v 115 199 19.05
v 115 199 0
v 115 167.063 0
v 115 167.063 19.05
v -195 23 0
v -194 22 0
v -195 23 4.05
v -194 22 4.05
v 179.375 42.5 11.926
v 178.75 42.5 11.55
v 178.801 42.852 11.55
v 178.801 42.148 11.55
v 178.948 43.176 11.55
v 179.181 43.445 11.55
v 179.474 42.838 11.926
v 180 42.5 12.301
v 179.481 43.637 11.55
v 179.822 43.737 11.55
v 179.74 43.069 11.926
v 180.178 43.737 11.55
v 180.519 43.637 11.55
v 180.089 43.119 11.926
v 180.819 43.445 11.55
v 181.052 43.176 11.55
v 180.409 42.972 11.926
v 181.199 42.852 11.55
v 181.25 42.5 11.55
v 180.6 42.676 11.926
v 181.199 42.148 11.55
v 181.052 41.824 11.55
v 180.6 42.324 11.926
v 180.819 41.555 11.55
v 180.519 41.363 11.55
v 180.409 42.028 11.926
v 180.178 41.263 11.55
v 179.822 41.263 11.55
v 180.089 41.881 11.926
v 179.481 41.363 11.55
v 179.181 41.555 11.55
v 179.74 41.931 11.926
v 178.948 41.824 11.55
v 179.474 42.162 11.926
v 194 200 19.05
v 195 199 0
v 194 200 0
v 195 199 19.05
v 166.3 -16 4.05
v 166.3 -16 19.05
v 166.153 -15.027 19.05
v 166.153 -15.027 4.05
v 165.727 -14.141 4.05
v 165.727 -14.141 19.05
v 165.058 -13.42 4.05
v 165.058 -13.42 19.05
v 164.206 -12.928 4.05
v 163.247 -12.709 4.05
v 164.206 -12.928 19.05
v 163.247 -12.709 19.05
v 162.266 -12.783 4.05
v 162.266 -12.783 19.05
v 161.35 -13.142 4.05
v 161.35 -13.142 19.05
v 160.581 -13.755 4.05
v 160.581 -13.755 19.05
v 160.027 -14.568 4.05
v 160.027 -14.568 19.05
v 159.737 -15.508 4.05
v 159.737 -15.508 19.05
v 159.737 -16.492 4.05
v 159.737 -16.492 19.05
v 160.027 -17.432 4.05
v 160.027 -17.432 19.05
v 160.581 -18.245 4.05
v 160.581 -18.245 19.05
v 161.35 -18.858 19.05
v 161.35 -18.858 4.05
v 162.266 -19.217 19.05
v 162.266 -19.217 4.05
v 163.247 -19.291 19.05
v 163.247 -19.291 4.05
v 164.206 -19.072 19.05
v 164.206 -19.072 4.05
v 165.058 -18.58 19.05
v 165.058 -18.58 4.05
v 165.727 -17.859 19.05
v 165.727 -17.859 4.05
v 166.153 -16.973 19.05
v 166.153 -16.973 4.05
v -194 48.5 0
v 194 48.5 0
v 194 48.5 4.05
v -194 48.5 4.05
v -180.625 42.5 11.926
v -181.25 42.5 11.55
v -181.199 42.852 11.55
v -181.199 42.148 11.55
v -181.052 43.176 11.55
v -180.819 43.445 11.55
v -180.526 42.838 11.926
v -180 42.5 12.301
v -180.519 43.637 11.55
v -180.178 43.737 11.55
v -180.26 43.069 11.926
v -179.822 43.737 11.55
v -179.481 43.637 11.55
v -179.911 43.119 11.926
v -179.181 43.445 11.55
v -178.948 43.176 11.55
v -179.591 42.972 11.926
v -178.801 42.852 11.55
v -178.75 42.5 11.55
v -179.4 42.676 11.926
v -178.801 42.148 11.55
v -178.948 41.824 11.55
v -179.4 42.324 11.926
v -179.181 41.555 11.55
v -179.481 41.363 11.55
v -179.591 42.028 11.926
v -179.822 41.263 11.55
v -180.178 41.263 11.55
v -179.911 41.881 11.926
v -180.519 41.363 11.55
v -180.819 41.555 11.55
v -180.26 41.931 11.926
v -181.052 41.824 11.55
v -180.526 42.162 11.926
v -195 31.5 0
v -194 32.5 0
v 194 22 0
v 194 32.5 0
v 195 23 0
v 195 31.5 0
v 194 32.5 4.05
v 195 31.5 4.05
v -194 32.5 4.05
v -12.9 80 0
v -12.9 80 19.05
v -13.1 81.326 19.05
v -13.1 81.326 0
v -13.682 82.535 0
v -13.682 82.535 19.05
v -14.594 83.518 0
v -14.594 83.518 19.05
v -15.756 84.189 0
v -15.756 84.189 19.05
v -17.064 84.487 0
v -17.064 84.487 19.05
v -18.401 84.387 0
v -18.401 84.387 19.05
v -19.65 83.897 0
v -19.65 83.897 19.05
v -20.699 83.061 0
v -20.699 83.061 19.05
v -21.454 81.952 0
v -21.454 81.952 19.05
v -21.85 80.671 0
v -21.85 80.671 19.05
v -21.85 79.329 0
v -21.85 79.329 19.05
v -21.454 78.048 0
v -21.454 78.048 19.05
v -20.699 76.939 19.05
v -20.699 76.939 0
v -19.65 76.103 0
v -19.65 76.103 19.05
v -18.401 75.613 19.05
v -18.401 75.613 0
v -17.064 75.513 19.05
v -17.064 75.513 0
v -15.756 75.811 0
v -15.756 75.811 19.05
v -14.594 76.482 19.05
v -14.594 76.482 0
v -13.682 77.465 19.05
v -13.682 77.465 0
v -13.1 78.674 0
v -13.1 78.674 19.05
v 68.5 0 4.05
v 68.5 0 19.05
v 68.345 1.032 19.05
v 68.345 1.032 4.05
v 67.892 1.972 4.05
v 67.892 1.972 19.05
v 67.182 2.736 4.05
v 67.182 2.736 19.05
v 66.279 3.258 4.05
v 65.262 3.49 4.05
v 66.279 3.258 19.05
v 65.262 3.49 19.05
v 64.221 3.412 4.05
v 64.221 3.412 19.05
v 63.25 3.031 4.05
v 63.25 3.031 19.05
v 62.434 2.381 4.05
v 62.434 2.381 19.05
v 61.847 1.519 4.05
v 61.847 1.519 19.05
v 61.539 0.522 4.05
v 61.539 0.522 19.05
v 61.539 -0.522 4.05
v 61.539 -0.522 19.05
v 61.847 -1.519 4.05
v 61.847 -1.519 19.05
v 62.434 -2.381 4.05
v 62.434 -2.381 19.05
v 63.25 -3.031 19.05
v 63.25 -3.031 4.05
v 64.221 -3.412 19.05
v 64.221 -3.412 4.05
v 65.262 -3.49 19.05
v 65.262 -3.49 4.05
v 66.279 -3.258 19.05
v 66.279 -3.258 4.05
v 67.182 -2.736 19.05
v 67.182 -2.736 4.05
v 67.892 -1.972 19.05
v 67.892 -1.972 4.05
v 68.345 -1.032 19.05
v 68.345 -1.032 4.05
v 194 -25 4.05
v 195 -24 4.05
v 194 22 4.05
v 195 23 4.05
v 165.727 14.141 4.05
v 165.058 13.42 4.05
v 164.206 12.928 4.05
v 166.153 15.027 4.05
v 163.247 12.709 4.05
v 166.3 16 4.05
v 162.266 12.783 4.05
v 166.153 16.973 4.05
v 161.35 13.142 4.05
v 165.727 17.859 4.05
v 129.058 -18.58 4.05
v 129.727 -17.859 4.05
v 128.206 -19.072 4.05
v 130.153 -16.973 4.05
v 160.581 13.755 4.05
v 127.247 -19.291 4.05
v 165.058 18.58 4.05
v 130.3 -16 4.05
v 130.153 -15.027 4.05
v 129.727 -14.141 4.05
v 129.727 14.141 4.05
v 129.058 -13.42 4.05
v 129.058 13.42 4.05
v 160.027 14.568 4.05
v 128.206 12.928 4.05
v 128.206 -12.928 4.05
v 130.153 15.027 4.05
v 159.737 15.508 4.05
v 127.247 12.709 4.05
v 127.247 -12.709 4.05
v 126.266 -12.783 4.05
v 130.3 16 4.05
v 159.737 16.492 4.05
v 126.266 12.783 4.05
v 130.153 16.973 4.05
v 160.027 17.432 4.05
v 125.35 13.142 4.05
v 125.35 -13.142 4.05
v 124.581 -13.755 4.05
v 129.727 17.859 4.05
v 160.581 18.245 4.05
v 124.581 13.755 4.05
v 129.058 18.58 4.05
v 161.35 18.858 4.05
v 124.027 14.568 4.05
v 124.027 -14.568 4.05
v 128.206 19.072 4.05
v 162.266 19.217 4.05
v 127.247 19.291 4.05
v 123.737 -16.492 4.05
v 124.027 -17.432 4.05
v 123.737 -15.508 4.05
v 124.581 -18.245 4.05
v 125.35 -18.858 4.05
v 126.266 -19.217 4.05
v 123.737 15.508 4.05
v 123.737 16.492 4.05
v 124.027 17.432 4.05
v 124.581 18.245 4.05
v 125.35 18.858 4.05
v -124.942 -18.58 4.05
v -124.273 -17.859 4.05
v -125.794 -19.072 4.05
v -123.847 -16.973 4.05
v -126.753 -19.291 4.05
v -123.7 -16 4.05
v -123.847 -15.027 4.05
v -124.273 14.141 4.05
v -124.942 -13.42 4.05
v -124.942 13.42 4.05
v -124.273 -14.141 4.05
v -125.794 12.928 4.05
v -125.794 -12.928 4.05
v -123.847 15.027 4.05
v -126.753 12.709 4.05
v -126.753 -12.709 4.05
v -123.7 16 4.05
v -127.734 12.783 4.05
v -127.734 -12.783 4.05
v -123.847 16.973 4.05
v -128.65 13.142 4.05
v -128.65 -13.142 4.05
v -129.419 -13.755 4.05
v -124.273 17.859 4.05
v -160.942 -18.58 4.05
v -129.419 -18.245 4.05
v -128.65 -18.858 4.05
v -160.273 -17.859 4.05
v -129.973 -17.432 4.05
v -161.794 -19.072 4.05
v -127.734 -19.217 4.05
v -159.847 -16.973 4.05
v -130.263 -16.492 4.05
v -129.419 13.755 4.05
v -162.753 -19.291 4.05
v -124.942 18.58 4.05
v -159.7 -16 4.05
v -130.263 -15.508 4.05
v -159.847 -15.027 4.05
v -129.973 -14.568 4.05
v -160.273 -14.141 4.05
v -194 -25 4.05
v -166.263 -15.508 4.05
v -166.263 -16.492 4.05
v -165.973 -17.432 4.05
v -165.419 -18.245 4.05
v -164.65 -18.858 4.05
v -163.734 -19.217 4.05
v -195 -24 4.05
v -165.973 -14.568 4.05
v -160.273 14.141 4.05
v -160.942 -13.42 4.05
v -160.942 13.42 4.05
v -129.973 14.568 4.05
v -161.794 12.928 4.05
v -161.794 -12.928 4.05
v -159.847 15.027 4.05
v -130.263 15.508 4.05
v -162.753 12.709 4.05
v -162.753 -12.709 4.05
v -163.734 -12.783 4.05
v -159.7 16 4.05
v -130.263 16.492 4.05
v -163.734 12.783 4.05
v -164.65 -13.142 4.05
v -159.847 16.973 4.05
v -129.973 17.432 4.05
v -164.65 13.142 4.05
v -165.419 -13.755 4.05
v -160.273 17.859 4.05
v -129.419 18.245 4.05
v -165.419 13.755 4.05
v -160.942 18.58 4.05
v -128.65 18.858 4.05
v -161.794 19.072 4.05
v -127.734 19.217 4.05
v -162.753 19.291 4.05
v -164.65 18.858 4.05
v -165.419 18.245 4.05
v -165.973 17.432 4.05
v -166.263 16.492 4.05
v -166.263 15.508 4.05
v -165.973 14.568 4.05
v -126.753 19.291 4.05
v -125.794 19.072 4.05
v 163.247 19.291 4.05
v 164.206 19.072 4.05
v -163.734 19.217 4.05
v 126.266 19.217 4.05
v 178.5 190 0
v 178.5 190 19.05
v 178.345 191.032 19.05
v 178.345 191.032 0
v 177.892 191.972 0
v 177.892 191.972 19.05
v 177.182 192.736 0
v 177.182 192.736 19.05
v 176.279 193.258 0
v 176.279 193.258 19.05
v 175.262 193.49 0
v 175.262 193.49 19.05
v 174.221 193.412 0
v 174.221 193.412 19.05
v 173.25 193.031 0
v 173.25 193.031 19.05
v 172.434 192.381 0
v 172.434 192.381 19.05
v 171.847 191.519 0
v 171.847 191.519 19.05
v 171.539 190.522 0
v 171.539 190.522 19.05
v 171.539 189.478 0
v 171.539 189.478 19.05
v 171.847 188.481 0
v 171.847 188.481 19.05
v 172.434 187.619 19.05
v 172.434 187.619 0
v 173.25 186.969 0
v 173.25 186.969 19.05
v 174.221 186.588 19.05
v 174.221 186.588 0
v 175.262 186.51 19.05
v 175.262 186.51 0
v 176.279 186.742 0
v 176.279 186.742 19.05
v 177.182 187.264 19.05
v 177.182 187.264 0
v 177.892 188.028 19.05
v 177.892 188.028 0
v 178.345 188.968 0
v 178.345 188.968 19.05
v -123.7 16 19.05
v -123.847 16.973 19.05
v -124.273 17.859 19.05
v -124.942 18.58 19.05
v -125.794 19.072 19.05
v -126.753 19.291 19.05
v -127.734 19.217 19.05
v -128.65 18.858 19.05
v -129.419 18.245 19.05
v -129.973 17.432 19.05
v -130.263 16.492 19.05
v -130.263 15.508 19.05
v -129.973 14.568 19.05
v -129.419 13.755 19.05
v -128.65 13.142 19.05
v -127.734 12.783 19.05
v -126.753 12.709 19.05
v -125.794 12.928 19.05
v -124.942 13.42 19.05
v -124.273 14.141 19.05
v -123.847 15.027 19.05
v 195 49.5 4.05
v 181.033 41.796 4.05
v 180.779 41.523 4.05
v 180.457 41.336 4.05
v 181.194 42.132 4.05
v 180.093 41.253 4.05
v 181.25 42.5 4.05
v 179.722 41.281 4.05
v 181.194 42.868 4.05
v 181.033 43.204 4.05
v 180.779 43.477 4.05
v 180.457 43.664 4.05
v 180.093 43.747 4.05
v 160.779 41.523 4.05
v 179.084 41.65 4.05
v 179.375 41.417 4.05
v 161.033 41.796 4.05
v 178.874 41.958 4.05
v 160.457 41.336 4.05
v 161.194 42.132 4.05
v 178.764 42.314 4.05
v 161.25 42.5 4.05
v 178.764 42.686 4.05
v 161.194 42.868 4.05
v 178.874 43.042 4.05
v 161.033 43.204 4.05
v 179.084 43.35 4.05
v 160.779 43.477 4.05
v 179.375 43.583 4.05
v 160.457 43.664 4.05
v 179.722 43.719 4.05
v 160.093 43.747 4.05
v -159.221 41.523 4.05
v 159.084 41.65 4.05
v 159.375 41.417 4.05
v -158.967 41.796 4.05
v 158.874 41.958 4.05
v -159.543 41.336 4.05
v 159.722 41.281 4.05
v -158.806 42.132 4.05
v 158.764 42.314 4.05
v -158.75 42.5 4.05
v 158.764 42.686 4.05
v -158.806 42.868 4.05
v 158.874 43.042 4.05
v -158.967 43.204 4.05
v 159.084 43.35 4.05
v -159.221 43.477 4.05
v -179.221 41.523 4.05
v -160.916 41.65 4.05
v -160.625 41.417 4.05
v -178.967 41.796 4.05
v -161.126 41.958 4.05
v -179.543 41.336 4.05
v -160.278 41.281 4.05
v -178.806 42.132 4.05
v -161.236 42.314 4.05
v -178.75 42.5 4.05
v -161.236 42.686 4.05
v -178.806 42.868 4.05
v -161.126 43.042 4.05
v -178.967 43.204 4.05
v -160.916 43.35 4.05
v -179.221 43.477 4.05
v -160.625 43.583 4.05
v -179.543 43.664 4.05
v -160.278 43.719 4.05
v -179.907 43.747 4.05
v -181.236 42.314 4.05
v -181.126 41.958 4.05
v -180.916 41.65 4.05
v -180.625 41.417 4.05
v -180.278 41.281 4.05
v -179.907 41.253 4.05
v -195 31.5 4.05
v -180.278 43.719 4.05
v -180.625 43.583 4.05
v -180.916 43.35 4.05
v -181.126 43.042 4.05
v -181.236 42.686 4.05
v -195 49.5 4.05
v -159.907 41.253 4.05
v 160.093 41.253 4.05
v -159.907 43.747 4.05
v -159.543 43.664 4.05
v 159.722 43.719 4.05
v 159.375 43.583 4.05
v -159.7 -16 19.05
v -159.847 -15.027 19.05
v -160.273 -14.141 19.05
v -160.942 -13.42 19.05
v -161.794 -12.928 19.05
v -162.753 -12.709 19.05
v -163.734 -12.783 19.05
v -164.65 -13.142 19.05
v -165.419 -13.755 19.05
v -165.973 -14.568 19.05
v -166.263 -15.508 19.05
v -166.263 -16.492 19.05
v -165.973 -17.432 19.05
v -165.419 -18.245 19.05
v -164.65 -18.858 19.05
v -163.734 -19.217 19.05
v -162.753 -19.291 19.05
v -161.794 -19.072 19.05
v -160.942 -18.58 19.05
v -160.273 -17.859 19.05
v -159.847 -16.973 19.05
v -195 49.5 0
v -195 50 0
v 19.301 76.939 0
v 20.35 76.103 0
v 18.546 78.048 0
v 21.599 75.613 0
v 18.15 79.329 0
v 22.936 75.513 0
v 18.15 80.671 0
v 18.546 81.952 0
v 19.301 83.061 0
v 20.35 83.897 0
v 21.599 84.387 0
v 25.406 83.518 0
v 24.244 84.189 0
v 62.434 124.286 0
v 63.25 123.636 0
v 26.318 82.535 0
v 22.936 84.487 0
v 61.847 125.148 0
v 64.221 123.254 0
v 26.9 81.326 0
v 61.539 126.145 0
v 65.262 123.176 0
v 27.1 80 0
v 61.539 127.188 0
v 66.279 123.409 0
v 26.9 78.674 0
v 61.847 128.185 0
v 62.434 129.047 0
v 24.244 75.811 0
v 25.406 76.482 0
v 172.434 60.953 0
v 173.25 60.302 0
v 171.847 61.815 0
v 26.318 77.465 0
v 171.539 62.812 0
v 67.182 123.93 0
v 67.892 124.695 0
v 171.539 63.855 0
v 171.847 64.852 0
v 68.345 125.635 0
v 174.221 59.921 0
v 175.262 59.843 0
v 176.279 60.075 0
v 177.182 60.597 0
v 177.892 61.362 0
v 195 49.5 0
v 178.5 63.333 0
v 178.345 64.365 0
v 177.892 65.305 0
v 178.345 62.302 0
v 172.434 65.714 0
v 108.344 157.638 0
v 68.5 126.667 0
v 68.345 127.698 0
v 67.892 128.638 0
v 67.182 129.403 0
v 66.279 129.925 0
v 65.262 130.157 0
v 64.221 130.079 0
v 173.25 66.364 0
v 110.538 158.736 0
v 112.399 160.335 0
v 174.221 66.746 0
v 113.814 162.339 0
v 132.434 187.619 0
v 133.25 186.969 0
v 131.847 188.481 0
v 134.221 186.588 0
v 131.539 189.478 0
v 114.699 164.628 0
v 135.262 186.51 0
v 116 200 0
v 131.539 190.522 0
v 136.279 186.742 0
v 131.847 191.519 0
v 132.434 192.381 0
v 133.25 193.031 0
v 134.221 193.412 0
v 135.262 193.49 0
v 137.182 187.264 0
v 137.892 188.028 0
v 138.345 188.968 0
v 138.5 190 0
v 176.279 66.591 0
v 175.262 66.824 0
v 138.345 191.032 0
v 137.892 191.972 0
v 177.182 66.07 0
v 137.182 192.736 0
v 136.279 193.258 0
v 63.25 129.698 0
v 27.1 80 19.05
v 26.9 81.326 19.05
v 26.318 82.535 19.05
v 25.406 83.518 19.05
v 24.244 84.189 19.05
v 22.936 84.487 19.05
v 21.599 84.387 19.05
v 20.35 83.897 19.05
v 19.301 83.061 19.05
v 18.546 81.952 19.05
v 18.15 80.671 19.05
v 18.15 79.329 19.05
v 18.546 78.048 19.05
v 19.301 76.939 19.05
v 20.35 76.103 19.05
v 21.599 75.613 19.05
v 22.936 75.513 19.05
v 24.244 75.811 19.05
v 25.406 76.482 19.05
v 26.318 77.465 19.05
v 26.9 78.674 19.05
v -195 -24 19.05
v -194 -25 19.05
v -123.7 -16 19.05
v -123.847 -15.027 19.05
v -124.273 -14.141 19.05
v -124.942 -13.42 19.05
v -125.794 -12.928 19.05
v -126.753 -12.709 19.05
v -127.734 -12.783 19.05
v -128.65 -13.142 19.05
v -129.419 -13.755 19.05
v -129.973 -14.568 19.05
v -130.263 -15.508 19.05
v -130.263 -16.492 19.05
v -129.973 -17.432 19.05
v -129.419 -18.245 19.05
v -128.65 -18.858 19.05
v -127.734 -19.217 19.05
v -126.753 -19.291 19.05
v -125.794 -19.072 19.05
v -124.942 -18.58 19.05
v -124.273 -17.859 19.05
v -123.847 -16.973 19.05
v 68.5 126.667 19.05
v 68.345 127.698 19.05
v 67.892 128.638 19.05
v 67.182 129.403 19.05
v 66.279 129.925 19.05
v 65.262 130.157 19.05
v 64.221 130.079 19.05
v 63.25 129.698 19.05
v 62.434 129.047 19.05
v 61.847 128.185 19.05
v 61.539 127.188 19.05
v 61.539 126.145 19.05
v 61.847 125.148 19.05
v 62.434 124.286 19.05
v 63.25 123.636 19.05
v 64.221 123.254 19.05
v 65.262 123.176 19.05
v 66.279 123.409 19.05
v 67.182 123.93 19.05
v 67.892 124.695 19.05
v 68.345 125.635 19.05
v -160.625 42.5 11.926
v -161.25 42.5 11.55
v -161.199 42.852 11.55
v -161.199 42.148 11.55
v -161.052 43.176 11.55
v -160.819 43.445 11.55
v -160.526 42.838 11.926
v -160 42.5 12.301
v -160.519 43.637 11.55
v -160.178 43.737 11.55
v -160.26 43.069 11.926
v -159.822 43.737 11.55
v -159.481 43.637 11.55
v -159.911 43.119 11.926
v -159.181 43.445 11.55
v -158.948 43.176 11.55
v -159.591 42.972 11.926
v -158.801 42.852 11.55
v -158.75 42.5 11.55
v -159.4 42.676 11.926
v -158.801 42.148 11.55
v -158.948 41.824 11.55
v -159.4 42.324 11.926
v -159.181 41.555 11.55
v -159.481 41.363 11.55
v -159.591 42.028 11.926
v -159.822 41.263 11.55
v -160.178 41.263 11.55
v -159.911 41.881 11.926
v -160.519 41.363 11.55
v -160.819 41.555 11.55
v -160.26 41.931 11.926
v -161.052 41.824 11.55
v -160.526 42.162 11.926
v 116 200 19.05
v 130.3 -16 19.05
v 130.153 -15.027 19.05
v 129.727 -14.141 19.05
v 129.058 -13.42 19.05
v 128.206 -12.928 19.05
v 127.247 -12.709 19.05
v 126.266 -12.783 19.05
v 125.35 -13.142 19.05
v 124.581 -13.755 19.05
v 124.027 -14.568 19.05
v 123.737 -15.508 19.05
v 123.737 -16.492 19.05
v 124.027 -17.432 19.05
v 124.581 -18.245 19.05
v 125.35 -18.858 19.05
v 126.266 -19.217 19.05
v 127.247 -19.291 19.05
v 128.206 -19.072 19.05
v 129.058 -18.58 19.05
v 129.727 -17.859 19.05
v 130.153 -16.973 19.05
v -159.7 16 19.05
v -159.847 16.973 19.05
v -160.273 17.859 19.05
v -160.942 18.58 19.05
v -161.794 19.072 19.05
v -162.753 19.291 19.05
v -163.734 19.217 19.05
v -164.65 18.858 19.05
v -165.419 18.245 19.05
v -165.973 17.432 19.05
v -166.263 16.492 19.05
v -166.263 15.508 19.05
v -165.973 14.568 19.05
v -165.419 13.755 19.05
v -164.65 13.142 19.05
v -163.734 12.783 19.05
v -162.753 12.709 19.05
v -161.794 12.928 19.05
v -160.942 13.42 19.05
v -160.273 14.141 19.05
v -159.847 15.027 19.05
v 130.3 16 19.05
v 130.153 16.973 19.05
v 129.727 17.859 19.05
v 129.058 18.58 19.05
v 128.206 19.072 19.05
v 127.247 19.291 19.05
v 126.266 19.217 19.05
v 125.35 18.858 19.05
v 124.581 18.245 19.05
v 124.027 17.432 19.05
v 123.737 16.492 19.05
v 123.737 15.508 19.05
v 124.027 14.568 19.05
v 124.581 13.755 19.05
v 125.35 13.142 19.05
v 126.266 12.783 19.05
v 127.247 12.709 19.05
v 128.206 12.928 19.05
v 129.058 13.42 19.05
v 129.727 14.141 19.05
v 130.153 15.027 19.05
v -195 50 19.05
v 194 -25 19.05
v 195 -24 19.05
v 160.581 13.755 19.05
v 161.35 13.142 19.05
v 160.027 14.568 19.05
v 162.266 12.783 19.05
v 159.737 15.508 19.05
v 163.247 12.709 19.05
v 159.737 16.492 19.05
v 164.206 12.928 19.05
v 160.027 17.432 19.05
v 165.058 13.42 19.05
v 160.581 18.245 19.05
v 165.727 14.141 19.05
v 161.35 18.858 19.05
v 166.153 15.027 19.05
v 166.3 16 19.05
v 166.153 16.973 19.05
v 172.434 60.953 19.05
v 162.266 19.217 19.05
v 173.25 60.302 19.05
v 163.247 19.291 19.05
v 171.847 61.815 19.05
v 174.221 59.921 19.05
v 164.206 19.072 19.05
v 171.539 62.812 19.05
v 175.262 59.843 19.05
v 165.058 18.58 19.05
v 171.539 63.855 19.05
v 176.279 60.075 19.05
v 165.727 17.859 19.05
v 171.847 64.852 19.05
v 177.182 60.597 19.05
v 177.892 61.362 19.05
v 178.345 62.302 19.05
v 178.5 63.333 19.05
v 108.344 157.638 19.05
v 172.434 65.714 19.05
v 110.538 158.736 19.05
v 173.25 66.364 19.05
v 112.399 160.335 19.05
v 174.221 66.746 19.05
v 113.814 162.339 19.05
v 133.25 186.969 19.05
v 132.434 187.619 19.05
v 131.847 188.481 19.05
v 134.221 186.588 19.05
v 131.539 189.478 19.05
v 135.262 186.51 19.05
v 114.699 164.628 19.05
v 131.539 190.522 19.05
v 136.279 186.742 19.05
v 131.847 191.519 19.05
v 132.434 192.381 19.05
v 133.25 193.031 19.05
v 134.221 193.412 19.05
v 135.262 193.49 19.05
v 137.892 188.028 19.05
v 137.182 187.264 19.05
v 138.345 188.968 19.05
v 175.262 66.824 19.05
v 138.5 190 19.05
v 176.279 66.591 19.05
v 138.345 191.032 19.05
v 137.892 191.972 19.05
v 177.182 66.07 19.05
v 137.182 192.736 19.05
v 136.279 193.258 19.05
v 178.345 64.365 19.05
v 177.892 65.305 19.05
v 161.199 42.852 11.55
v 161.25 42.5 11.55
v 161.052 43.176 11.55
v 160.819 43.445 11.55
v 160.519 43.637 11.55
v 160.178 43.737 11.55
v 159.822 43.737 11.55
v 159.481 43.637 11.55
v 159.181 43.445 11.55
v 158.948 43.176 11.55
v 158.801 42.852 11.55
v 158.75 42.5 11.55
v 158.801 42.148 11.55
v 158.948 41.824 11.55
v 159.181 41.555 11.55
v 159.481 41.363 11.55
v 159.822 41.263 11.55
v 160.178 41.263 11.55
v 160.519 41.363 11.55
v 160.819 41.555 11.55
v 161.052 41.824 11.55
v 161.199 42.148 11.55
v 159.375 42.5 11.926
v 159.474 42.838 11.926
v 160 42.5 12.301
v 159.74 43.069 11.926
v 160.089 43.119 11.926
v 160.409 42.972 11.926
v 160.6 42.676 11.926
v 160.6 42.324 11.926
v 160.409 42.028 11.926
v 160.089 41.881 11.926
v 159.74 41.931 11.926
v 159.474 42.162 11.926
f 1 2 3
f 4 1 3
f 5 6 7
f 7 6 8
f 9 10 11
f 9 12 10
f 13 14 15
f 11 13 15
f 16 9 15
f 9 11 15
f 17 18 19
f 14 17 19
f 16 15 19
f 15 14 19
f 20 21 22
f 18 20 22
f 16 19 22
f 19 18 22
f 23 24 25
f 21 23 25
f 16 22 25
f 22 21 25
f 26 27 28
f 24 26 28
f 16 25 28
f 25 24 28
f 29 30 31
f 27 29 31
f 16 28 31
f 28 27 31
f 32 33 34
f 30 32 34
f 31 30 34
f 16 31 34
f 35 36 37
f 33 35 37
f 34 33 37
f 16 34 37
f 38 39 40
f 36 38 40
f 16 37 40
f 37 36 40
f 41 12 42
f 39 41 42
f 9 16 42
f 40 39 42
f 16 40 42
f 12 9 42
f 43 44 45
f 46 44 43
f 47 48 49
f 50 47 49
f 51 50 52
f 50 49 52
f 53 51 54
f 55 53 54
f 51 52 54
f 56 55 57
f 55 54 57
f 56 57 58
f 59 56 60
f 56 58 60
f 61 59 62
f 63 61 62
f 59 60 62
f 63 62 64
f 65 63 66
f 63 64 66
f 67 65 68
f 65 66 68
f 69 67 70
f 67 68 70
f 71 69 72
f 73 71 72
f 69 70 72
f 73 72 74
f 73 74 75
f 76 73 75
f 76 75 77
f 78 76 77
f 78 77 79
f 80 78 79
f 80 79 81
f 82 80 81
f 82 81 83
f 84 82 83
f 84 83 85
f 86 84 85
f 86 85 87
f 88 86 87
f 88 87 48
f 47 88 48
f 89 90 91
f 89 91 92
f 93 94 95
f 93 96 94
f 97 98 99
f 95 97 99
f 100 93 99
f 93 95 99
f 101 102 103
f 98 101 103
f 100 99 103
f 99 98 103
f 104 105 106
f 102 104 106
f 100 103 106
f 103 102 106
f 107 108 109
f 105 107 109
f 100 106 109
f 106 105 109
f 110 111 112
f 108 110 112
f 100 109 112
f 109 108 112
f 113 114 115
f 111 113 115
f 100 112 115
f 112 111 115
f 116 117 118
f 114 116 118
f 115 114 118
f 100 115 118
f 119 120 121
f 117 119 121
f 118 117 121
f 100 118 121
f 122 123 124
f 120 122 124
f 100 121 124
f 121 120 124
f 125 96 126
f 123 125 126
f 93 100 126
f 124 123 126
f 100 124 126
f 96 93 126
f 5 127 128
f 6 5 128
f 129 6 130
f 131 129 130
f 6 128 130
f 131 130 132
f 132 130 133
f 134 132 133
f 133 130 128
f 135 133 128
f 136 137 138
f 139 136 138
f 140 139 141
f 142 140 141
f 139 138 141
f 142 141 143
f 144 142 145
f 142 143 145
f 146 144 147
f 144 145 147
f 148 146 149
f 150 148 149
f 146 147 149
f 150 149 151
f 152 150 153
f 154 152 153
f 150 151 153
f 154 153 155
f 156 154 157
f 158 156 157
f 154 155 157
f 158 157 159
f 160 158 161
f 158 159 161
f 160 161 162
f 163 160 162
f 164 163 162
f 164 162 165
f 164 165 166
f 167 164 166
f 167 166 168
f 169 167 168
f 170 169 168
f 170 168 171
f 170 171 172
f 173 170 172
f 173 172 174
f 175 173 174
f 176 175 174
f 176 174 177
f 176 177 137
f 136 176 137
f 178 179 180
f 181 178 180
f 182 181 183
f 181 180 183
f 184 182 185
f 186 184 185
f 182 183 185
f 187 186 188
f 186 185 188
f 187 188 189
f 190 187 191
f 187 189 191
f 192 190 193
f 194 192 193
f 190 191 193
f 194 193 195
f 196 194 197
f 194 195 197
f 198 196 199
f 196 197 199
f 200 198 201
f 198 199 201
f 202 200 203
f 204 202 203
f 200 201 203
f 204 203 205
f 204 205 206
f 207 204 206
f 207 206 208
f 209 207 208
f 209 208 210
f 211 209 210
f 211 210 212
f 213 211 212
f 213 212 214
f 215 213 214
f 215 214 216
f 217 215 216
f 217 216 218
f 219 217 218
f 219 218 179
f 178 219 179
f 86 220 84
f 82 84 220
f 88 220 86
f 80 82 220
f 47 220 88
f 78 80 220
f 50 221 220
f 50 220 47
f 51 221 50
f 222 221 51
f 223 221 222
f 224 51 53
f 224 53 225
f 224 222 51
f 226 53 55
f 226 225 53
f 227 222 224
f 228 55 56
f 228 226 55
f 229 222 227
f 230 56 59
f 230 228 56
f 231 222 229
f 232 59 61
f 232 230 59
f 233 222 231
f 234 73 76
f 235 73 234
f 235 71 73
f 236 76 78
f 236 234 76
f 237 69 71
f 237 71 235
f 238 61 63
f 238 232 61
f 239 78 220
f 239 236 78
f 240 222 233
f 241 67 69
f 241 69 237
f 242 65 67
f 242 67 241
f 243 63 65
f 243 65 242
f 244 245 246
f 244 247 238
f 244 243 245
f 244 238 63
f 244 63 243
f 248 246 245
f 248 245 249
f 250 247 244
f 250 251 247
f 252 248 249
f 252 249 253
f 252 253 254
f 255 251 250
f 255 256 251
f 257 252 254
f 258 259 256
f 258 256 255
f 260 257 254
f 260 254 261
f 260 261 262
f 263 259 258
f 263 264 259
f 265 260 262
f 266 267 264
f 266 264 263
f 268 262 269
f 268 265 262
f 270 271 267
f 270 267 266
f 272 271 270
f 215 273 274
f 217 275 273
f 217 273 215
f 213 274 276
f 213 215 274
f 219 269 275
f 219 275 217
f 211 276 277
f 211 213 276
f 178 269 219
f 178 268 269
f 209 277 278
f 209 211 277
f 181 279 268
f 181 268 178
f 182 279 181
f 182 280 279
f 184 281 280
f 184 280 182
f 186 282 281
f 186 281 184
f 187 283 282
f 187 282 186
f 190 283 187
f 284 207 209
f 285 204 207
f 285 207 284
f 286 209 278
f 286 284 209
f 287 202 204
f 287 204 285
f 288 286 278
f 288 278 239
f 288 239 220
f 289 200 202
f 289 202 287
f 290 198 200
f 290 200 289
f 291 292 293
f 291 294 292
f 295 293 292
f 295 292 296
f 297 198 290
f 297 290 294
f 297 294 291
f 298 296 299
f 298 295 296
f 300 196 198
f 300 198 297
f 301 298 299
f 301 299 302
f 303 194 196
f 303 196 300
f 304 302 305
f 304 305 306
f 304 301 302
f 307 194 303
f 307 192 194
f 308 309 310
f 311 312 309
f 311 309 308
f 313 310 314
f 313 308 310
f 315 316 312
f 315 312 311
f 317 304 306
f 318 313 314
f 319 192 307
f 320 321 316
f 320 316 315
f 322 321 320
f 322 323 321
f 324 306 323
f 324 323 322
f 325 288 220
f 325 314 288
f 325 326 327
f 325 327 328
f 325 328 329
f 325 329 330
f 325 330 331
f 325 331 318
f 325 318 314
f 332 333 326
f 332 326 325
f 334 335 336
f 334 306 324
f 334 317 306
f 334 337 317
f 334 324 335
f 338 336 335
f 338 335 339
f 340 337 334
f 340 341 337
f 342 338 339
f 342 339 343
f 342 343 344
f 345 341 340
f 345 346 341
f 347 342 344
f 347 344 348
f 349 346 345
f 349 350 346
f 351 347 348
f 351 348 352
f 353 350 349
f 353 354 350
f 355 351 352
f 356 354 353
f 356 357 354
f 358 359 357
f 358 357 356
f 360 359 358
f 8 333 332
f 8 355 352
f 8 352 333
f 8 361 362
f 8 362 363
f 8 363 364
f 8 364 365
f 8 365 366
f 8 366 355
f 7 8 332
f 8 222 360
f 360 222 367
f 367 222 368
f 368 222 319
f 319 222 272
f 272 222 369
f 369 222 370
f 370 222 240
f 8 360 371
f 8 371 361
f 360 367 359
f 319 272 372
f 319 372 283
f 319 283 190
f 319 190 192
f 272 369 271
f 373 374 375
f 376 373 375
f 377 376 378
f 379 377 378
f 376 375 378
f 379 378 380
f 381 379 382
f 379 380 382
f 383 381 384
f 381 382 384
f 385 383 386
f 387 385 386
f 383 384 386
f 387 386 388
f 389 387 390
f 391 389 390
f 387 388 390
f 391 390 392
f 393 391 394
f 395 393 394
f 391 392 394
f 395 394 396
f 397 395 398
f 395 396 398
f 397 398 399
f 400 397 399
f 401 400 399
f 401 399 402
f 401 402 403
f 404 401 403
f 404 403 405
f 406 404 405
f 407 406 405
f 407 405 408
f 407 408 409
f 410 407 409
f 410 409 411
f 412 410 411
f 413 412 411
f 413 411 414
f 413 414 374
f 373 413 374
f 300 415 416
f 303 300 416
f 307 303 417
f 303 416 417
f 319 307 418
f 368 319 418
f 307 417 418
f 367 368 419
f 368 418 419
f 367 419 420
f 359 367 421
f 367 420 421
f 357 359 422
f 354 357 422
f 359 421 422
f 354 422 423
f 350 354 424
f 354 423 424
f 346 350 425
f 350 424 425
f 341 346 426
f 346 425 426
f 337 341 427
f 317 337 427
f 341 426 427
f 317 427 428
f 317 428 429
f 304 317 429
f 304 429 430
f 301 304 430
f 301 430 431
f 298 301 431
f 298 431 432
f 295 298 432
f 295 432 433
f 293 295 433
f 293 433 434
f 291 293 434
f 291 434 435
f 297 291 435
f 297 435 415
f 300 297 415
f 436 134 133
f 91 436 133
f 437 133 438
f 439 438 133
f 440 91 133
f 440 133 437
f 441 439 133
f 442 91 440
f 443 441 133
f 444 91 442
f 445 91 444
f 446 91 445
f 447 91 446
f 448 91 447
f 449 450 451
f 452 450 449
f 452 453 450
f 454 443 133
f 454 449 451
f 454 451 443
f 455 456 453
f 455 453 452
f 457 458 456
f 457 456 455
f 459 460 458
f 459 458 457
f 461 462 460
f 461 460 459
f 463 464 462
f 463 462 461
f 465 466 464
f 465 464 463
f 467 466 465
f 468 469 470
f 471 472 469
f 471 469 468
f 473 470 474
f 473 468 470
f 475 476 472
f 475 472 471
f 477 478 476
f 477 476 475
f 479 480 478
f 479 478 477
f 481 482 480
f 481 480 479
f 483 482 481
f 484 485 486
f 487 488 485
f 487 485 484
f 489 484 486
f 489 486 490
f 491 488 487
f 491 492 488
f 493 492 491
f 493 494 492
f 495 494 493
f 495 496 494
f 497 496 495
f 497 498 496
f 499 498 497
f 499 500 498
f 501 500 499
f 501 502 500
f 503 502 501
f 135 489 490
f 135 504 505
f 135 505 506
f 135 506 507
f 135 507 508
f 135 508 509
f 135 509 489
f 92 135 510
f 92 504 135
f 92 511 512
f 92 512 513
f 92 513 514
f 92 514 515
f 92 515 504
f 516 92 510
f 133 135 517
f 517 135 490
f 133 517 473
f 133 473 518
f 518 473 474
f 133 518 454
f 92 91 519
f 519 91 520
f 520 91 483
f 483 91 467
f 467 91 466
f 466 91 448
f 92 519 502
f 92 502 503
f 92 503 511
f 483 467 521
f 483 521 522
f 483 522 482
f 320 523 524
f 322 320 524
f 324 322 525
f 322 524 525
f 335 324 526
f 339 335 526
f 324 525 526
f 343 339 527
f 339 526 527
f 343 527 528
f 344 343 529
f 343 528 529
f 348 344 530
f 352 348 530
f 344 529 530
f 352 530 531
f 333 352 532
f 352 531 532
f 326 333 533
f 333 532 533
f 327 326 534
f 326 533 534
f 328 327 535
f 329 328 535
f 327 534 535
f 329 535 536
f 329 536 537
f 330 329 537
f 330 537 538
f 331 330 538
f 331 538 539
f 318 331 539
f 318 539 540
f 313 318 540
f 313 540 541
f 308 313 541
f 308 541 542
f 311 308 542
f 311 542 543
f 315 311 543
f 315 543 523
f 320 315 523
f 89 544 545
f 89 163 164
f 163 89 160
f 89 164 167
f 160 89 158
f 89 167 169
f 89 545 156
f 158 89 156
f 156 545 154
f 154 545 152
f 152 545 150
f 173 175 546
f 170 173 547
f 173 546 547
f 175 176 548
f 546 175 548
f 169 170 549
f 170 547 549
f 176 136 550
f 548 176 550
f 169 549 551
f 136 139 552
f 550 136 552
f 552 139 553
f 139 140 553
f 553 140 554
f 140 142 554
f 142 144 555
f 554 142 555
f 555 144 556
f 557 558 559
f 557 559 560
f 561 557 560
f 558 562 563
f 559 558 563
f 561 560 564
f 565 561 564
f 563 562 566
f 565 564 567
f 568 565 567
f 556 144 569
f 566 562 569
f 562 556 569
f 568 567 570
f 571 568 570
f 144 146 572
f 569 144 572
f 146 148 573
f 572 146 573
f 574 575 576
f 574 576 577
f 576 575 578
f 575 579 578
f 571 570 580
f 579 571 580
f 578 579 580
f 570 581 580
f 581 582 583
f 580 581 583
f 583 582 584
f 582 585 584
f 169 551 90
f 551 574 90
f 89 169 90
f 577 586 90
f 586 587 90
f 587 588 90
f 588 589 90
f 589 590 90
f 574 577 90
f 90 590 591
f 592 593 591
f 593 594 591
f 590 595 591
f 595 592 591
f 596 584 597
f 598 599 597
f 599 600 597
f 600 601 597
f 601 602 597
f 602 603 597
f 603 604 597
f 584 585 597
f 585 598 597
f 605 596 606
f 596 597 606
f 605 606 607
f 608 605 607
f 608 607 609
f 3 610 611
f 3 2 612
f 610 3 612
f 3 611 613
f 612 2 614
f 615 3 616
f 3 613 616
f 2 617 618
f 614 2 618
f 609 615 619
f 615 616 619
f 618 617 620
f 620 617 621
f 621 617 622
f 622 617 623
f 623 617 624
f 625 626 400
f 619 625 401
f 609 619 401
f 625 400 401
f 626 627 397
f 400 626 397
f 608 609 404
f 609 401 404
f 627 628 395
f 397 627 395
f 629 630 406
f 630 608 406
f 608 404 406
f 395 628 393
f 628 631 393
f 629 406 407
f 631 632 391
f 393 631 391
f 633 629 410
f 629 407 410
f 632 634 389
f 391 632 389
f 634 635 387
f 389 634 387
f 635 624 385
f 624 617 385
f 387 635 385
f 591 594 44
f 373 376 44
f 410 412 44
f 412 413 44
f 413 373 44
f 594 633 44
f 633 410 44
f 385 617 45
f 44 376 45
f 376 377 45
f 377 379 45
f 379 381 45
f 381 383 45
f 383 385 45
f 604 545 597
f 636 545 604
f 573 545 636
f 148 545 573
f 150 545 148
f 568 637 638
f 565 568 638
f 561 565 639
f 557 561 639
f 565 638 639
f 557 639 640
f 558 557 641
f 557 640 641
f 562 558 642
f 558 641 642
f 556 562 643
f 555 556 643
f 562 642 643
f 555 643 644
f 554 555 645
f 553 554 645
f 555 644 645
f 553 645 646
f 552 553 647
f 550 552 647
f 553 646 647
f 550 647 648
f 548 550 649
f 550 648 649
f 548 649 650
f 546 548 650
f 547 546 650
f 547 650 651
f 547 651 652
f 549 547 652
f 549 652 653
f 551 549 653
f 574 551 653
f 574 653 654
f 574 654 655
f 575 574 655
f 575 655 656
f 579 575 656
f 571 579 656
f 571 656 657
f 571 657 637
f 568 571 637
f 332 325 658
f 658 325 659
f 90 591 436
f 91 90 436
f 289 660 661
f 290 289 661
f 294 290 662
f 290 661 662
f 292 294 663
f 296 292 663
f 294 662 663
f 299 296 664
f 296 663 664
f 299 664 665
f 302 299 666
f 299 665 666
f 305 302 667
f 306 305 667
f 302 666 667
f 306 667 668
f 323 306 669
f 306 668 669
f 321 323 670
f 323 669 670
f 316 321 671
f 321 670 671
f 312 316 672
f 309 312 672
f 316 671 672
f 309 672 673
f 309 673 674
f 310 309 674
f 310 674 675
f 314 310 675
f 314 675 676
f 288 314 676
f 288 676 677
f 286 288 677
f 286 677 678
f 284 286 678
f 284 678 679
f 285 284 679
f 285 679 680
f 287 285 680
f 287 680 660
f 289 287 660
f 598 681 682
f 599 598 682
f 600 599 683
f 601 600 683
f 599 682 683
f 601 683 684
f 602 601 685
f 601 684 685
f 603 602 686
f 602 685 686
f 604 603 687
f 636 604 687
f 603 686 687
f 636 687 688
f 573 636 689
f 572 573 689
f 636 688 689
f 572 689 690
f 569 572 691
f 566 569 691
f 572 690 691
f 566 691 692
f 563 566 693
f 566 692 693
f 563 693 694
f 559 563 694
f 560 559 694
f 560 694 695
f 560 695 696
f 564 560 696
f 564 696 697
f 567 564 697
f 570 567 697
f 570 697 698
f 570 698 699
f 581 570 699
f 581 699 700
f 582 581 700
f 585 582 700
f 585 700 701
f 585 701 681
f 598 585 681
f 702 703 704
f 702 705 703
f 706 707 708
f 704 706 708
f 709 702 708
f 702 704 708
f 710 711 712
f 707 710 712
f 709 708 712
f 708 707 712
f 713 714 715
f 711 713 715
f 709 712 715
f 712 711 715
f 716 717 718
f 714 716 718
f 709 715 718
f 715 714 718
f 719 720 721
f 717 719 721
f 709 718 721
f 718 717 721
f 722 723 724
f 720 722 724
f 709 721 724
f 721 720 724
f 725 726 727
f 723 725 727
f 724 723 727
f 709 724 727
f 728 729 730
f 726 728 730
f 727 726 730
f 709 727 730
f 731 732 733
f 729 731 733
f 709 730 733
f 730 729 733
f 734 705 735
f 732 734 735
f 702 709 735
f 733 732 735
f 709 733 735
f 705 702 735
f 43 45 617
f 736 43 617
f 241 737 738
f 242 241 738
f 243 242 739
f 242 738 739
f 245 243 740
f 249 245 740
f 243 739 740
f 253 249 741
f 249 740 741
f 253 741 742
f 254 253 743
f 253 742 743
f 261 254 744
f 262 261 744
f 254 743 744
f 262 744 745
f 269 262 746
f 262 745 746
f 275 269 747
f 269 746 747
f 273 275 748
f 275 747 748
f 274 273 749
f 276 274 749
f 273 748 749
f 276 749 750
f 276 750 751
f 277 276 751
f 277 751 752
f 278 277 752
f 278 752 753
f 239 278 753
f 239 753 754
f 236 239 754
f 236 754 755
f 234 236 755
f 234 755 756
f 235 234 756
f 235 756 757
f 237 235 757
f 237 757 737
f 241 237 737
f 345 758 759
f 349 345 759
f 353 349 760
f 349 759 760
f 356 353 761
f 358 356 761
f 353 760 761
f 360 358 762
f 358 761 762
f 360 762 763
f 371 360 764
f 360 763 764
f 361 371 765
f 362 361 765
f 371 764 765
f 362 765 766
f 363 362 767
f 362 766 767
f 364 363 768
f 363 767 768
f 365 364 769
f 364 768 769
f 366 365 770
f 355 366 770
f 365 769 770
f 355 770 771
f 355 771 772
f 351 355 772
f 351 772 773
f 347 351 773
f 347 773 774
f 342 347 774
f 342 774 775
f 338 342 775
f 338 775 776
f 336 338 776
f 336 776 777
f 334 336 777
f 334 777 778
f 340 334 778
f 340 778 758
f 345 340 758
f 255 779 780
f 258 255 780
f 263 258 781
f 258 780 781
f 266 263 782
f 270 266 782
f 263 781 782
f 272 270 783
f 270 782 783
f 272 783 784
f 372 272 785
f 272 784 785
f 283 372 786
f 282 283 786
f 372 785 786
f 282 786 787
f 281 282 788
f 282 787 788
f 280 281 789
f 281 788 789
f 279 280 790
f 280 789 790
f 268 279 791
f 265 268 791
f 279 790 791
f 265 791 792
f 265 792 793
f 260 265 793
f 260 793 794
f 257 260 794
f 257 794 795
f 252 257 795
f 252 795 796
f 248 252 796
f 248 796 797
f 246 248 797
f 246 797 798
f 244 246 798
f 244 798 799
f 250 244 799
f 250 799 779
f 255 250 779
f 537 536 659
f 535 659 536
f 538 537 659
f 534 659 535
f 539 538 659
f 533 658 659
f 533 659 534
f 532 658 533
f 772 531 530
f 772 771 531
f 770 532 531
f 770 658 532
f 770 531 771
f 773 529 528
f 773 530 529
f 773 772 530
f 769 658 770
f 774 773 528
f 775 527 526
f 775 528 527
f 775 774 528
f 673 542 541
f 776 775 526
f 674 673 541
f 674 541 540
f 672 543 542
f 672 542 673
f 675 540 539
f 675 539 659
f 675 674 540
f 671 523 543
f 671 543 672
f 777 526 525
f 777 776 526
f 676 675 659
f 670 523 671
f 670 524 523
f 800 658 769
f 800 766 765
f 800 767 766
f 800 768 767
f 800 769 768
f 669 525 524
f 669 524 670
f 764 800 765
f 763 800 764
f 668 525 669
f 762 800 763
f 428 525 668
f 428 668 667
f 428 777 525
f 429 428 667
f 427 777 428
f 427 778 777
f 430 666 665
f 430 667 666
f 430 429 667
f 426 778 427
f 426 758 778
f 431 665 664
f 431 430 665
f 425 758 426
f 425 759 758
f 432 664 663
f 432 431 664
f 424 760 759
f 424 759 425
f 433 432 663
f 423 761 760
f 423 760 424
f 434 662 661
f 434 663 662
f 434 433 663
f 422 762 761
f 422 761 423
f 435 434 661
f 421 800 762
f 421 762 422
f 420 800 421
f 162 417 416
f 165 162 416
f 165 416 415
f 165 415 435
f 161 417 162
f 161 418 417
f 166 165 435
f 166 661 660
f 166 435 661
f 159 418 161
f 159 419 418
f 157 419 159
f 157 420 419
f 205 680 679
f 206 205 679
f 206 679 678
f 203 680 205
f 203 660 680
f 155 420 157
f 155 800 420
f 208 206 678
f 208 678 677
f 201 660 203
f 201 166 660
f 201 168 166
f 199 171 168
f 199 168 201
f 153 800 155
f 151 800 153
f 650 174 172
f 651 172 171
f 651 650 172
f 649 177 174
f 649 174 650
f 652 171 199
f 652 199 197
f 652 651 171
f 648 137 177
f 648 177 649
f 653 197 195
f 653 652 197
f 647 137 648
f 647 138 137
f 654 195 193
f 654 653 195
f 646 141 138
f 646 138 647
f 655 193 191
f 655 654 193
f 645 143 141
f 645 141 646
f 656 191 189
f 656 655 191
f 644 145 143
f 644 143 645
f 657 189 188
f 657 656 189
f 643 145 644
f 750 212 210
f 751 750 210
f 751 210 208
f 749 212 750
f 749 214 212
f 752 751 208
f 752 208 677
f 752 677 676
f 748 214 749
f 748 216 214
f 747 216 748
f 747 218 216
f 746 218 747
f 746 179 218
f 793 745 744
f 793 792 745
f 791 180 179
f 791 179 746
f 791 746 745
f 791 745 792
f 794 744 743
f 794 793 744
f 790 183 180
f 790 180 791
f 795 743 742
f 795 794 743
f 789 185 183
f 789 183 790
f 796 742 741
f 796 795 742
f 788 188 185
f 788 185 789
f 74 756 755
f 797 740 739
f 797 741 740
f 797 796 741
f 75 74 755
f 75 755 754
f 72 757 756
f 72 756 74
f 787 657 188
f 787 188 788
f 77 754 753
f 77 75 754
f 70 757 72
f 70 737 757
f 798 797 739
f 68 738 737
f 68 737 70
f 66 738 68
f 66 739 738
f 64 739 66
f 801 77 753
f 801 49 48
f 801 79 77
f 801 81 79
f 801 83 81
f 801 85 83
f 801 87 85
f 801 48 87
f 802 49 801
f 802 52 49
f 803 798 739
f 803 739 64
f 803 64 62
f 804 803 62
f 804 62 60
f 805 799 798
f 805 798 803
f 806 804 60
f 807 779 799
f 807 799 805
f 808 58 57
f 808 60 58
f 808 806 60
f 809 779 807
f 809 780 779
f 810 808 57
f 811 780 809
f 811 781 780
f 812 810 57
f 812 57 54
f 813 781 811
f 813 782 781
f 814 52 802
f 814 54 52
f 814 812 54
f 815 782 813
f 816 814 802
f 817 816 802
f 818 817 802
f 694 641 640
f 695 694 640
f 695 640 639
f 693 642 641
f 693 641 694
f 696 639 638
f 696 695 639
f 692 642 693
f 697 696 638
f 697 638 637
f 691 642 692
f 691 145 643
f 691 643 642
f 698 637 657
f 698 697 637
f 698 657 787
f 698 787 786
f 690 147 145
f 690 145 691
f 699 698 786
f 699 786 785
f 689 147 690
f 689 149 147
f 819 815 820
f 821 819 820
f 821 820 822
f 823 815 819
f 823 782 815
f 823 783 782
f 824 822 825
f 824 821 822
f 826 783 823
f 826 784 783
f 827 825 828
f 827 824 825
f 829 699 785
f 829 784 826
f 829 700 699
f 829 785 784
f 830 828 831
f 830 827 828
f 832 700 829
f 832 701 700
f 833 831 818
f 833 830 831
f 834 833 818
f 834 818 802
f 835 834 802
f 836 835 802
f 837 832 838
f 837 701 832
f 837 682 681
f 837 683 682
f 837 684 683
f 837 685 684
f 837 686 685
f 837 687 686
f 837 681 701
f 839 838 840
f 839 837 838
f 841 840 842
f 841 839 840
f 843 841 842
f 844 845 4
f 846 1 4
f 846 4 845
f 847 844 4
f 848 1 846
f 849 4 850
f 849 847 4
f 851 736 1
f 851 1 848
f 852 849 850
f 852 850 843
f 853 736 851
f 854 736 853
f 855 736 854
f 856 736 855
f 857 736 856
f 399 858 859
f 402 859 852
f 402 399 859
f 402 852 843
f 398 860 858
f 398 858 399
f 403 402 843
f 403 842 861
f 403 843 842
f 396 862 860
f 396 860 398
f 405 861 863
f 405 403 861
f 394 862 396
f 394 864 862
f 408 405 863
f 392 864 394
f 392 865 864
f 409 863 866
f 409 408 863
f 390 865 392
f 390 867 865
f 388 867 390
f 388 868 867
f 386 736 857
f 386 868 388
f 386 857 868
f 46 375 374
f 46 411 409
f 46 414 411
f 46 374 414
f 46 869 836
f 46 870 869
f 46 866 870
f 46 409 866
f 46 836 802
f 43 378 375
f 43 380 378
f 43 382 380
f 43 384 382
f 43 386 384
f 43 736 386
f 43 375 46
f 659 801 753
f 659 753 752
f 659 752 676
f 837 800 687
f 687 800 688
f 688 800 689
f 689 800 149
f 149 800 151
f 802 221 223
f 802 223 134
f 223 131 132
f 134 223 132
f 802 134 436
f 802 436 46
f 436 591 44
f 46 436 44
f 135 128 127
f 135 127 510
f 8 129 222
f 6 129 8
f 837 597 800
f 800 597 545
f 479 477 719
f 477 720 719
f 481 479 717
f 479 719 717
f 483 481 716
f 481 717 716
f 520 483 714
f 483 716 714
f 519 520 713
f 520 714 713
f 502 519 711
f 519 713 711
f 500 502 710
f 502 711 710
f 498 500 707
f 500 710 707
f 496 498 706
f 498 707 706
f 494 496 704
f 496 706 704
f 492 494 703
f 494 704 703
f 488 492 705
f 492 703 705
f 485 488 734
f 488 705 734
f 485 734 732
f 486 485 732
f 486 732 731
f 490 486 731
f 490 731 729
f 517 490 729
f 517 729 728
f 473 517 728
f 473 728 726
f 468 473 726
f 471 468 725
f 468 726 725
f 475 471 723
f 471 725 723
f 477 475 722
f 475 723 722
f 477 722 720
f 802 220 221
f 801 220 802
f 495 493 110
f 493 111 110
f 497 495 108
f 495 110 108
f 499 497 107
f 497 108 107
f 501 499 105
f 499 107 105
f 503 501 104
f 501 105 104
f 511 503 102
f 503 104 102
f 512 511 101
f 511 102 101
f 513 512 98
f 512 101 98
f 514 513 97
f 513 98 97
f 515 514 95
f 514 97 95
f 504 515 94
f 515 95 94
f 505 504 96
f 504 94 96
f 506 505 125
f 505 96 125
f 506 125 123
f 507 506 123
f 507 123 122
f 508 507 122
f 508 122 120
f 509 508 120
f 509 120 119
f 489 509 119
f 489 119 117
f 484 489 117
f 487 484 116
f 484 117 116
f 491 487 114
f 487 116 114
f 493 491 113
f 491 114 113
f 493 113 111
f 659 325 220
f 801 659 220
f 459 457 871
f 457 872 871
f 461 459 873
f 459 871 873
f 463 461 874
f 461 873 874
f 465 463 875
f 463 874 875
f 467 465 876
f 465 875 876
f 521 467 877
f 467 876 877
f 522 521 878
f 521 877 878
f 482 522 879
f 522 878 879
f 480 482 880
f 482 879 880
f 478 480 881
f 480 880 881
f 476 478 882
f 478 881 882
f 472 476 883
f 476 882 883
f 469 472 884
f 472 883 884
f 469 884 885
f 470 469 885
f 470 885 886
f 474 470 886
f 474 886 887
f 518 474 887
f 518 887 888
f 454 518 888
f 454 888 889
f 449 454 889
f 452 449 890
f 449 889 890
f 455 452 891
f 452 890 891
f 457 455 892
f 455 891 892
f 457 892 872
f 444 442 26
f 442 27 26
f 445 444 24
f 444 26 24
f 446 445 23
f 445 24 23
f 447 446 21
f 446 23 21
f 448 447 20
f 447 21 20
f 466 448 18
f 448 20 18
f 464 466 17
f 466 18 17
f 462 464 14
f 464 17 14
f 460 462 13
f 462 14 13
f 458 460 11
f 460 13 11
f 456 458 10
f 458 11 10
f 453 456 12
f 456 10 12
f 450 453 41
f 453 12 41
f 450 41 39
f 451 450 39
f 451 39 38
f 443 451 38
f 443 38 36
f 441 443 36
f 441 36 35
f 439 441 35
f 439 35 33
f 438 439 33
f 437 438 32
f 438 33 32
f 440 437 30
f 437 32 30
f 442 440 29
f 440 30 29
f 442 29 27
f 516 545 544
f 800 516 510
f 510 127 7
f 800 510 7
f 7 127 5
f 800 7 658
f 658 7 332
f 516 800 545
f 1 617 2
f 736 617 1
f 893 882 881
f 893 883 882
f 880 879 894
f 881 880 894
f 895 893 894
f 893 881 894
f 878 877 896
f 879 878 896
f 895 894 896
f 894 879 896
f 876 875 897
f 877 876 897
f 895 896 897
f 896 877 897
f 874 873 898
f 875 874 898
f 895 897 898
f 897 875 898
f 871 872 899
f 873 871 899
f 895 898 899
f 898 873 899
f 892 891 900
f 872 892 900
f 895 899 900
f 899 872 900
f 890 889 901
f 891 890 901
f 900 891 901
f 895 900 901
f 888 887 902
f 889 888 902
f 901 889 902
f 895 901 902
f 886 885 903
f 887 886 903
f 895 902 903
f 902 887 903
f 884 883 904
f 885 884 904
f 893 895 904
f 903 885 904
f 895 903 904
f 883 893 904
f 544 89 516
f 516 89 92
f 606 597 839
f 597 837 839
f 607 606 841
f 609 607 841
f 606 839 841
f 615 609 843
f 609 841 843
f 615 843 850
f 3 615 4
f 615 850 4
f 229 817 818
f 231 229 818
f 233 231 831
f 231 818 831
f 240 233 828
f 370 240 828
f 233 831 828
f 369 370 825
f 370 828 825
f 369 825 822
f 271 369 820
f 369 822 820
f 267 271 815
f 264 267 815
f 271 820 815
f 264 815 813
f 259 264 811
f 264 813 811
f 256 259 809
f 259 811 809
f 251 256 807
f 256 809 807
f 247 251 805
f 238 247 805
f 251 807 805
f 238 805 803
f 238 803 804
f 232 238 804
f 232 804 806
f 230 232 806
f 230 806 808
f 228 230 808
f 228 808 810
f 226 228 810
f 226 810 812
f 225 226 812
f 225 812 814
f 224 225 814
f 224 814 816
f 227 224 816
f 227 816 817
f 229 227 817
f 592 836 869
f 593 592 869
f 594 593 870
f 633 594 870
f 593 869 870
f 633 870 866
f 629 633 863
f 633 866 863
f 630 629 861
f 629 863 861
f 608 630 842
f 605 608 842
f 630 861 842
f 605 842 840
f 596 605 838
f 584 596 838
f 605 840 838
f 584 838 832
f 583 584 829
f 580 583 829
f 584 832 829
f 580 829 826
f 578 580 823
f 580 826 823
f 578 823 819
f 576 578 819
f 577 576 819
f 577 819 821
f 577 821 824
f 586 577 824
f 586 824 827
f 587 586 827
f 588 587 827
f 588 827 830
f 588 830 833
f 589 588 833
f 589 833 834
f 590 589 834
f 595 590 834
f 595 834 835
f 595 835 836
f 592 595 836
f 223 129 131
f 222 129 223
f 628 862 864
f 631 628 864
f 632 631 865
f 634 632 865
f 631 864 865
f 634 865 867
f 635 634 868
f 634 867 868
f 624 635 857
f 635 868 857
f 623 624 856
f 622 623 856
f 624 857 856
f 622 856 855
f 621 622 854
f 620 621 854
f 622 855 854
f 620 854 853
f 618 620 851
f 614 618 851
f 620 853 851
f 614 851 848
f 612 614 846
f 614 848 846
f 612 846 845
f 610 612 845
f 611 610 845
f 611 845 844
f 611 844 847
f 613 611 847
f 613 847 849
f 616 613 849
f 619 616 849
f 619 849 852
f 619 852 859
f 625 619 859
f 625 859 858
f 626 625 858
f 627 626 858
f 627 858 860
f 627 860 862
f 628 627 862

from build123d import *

# Parameters (mm, degrees)
BOSS_EXTRUDE1_DEPTH       = 19.05
SKETCH2_W                 = 390
SKETCH2_H                 = 47
SKETCH2_H_2               = 16
CUT_EXTRUDE2_DEPTH        = 4.05
M6_CLEARANCE_HOLE1_D      = 6.6
M6_CLEARANCE_HOLE2_D      = 6.6
M3X0_5_TAPPED_HOLE1_D     = 2.5
M3X0_5_TAPPED_HOLE1_DEPTH = 7.5
M3X0_5_TAPPED_HOLE1_TIP   = 0.751075774
M8X1_0_TAPPED_HOLE1_D     = 7
M8_CLEARANCE_HOLE1_D      = 9
FILLET1_R                 = 10
CHAMFER1_SIZE             = 1


with BuildPart() as part:
    # Sketch1 → Boss-Extrude1 (new body)
    with BuildSketch(Plane.XY):
        Polygon((-195, 50), (-195, -25), (195, -25), (195, 200), (115, 200), (115, 160), align=None)
    extrude(amount=BOSS_EXTRUDE1_DEPTH)

    # Sketch2 → Cut-Extrude2 (cut)
    with BuildSketch(Plane(origin=(0, 0, 0), x_dir=(-1, 0, 0), z_dir=(0, 0, -1))):
        with Locations((0, -1.5)):
            Rectangle(SKETCH2_W, SKETCH2_H)
        with Locations((0, 40.5)):
            Rectangle(SKETCH2_W, SKETCH2_H_2)
    extrude(amount=-CUT_EXTRUDE2_DEPTH, mode=Mode.SUBTRACT)

    # M6 Clearance Hole1 (through all)
    with Locations(Plane(origin=(0, 0, 4.05), x_dir=(-1, 0, 0), z_dir=(0, 0, -1))):
        with Locations((127, 16), (163, 16), (163, -16), (127, -16)):
            Hole(M6_CLEARANCE_HOLE1_D / 2)

    # M6 Clearance Hole2 (through all)
    with Locations(Plane(origin=(0, 0, 4.05), x_dir=(-1, 0, 0), z_dir=(0, 0, -1))):
        with Locations((-163, 16), (-127, 16), (-127, -16), (-163, -16)):
            Hole(M6_CLEARANCE_HOLE2_D / 2)

    # M3x0.5 Tapped Hole1
    with Locations(Plane(origin=(0, 0, 4.05), x_dir=(-1, 0, 0), z_dir=(0, 0, -1))):
        with Locations((-180, 42.5), (-160, 42.5), (180, 42.5), (160, 42.5)):
            Hole(M3X0_5_TAPPED_HOLE1_D / 2, depth=M3X0_5_TAPPED_HOLE1_DEPTH)
            with Locations((0, 0, -(M3X0_5_TAPPED_HOLE1_DEPTH + M3X0_5_TAPPED_HOLE1_TIP / 2))):  # 118° drill point
                Cone(0, M3X0_5_TAPPED_HOLE1_D / 2, M3X0_5_TAPPED_HOLE1_TIP, mode=Mode.SUBTRACT)

    # M8x1.0 Tapped Hole1 (through all)
    with Locations(Plane(origin=(0, 0, 0), x_dir=(-1, 0, 0), z_dir=(0, 0, -1))):
        with Locations((-175, 190), (-135, 190), (-65, 126.666666667), (-175, 63.333333333), (-65, 0)):
            Hole(M8X1_0_TAPPED_HOLE1_D / 2)

    # M8 Clearance Hole1 (through all)
    with Locations(Plane(origin=(0, 0, 0), x_dir=(-1, 0, 0), z_dir=(0, 0, -1))):
        with Locations((-22.6, 80), (17.4, 80)):
            Hole(M8_CLEARANCE_HOLE1_D / 2)

    # Fillet1
    fillet1_edges = [part.edges().sort_by_distance(p)[0] for p in [
        (115, 160, 9.525),
    ]]
    fillet(fillet1_edges, radius=FILLET1_R)

    # Chamfer1
    chamfer1_edges = [part.edges().sort_by_distance(p)[0] for p in [
        (115, 200, 9.525),
        (195, 200, 9.525),
        (195, -25, 11.55),
        (-195, -25, 11.55),
        (-195, 22, 2.025),
        (195, 22, 2.025),
        (-195, 32.5, 2.025),
        (-195, 48.5, 2.025),
        (195, 48.5, 2.025),
        (195, 32.5, 2.025),
    ]]
    chamfer(chamfer1_edges, length=CHAMFER1_SIZE)


solid = part.part
